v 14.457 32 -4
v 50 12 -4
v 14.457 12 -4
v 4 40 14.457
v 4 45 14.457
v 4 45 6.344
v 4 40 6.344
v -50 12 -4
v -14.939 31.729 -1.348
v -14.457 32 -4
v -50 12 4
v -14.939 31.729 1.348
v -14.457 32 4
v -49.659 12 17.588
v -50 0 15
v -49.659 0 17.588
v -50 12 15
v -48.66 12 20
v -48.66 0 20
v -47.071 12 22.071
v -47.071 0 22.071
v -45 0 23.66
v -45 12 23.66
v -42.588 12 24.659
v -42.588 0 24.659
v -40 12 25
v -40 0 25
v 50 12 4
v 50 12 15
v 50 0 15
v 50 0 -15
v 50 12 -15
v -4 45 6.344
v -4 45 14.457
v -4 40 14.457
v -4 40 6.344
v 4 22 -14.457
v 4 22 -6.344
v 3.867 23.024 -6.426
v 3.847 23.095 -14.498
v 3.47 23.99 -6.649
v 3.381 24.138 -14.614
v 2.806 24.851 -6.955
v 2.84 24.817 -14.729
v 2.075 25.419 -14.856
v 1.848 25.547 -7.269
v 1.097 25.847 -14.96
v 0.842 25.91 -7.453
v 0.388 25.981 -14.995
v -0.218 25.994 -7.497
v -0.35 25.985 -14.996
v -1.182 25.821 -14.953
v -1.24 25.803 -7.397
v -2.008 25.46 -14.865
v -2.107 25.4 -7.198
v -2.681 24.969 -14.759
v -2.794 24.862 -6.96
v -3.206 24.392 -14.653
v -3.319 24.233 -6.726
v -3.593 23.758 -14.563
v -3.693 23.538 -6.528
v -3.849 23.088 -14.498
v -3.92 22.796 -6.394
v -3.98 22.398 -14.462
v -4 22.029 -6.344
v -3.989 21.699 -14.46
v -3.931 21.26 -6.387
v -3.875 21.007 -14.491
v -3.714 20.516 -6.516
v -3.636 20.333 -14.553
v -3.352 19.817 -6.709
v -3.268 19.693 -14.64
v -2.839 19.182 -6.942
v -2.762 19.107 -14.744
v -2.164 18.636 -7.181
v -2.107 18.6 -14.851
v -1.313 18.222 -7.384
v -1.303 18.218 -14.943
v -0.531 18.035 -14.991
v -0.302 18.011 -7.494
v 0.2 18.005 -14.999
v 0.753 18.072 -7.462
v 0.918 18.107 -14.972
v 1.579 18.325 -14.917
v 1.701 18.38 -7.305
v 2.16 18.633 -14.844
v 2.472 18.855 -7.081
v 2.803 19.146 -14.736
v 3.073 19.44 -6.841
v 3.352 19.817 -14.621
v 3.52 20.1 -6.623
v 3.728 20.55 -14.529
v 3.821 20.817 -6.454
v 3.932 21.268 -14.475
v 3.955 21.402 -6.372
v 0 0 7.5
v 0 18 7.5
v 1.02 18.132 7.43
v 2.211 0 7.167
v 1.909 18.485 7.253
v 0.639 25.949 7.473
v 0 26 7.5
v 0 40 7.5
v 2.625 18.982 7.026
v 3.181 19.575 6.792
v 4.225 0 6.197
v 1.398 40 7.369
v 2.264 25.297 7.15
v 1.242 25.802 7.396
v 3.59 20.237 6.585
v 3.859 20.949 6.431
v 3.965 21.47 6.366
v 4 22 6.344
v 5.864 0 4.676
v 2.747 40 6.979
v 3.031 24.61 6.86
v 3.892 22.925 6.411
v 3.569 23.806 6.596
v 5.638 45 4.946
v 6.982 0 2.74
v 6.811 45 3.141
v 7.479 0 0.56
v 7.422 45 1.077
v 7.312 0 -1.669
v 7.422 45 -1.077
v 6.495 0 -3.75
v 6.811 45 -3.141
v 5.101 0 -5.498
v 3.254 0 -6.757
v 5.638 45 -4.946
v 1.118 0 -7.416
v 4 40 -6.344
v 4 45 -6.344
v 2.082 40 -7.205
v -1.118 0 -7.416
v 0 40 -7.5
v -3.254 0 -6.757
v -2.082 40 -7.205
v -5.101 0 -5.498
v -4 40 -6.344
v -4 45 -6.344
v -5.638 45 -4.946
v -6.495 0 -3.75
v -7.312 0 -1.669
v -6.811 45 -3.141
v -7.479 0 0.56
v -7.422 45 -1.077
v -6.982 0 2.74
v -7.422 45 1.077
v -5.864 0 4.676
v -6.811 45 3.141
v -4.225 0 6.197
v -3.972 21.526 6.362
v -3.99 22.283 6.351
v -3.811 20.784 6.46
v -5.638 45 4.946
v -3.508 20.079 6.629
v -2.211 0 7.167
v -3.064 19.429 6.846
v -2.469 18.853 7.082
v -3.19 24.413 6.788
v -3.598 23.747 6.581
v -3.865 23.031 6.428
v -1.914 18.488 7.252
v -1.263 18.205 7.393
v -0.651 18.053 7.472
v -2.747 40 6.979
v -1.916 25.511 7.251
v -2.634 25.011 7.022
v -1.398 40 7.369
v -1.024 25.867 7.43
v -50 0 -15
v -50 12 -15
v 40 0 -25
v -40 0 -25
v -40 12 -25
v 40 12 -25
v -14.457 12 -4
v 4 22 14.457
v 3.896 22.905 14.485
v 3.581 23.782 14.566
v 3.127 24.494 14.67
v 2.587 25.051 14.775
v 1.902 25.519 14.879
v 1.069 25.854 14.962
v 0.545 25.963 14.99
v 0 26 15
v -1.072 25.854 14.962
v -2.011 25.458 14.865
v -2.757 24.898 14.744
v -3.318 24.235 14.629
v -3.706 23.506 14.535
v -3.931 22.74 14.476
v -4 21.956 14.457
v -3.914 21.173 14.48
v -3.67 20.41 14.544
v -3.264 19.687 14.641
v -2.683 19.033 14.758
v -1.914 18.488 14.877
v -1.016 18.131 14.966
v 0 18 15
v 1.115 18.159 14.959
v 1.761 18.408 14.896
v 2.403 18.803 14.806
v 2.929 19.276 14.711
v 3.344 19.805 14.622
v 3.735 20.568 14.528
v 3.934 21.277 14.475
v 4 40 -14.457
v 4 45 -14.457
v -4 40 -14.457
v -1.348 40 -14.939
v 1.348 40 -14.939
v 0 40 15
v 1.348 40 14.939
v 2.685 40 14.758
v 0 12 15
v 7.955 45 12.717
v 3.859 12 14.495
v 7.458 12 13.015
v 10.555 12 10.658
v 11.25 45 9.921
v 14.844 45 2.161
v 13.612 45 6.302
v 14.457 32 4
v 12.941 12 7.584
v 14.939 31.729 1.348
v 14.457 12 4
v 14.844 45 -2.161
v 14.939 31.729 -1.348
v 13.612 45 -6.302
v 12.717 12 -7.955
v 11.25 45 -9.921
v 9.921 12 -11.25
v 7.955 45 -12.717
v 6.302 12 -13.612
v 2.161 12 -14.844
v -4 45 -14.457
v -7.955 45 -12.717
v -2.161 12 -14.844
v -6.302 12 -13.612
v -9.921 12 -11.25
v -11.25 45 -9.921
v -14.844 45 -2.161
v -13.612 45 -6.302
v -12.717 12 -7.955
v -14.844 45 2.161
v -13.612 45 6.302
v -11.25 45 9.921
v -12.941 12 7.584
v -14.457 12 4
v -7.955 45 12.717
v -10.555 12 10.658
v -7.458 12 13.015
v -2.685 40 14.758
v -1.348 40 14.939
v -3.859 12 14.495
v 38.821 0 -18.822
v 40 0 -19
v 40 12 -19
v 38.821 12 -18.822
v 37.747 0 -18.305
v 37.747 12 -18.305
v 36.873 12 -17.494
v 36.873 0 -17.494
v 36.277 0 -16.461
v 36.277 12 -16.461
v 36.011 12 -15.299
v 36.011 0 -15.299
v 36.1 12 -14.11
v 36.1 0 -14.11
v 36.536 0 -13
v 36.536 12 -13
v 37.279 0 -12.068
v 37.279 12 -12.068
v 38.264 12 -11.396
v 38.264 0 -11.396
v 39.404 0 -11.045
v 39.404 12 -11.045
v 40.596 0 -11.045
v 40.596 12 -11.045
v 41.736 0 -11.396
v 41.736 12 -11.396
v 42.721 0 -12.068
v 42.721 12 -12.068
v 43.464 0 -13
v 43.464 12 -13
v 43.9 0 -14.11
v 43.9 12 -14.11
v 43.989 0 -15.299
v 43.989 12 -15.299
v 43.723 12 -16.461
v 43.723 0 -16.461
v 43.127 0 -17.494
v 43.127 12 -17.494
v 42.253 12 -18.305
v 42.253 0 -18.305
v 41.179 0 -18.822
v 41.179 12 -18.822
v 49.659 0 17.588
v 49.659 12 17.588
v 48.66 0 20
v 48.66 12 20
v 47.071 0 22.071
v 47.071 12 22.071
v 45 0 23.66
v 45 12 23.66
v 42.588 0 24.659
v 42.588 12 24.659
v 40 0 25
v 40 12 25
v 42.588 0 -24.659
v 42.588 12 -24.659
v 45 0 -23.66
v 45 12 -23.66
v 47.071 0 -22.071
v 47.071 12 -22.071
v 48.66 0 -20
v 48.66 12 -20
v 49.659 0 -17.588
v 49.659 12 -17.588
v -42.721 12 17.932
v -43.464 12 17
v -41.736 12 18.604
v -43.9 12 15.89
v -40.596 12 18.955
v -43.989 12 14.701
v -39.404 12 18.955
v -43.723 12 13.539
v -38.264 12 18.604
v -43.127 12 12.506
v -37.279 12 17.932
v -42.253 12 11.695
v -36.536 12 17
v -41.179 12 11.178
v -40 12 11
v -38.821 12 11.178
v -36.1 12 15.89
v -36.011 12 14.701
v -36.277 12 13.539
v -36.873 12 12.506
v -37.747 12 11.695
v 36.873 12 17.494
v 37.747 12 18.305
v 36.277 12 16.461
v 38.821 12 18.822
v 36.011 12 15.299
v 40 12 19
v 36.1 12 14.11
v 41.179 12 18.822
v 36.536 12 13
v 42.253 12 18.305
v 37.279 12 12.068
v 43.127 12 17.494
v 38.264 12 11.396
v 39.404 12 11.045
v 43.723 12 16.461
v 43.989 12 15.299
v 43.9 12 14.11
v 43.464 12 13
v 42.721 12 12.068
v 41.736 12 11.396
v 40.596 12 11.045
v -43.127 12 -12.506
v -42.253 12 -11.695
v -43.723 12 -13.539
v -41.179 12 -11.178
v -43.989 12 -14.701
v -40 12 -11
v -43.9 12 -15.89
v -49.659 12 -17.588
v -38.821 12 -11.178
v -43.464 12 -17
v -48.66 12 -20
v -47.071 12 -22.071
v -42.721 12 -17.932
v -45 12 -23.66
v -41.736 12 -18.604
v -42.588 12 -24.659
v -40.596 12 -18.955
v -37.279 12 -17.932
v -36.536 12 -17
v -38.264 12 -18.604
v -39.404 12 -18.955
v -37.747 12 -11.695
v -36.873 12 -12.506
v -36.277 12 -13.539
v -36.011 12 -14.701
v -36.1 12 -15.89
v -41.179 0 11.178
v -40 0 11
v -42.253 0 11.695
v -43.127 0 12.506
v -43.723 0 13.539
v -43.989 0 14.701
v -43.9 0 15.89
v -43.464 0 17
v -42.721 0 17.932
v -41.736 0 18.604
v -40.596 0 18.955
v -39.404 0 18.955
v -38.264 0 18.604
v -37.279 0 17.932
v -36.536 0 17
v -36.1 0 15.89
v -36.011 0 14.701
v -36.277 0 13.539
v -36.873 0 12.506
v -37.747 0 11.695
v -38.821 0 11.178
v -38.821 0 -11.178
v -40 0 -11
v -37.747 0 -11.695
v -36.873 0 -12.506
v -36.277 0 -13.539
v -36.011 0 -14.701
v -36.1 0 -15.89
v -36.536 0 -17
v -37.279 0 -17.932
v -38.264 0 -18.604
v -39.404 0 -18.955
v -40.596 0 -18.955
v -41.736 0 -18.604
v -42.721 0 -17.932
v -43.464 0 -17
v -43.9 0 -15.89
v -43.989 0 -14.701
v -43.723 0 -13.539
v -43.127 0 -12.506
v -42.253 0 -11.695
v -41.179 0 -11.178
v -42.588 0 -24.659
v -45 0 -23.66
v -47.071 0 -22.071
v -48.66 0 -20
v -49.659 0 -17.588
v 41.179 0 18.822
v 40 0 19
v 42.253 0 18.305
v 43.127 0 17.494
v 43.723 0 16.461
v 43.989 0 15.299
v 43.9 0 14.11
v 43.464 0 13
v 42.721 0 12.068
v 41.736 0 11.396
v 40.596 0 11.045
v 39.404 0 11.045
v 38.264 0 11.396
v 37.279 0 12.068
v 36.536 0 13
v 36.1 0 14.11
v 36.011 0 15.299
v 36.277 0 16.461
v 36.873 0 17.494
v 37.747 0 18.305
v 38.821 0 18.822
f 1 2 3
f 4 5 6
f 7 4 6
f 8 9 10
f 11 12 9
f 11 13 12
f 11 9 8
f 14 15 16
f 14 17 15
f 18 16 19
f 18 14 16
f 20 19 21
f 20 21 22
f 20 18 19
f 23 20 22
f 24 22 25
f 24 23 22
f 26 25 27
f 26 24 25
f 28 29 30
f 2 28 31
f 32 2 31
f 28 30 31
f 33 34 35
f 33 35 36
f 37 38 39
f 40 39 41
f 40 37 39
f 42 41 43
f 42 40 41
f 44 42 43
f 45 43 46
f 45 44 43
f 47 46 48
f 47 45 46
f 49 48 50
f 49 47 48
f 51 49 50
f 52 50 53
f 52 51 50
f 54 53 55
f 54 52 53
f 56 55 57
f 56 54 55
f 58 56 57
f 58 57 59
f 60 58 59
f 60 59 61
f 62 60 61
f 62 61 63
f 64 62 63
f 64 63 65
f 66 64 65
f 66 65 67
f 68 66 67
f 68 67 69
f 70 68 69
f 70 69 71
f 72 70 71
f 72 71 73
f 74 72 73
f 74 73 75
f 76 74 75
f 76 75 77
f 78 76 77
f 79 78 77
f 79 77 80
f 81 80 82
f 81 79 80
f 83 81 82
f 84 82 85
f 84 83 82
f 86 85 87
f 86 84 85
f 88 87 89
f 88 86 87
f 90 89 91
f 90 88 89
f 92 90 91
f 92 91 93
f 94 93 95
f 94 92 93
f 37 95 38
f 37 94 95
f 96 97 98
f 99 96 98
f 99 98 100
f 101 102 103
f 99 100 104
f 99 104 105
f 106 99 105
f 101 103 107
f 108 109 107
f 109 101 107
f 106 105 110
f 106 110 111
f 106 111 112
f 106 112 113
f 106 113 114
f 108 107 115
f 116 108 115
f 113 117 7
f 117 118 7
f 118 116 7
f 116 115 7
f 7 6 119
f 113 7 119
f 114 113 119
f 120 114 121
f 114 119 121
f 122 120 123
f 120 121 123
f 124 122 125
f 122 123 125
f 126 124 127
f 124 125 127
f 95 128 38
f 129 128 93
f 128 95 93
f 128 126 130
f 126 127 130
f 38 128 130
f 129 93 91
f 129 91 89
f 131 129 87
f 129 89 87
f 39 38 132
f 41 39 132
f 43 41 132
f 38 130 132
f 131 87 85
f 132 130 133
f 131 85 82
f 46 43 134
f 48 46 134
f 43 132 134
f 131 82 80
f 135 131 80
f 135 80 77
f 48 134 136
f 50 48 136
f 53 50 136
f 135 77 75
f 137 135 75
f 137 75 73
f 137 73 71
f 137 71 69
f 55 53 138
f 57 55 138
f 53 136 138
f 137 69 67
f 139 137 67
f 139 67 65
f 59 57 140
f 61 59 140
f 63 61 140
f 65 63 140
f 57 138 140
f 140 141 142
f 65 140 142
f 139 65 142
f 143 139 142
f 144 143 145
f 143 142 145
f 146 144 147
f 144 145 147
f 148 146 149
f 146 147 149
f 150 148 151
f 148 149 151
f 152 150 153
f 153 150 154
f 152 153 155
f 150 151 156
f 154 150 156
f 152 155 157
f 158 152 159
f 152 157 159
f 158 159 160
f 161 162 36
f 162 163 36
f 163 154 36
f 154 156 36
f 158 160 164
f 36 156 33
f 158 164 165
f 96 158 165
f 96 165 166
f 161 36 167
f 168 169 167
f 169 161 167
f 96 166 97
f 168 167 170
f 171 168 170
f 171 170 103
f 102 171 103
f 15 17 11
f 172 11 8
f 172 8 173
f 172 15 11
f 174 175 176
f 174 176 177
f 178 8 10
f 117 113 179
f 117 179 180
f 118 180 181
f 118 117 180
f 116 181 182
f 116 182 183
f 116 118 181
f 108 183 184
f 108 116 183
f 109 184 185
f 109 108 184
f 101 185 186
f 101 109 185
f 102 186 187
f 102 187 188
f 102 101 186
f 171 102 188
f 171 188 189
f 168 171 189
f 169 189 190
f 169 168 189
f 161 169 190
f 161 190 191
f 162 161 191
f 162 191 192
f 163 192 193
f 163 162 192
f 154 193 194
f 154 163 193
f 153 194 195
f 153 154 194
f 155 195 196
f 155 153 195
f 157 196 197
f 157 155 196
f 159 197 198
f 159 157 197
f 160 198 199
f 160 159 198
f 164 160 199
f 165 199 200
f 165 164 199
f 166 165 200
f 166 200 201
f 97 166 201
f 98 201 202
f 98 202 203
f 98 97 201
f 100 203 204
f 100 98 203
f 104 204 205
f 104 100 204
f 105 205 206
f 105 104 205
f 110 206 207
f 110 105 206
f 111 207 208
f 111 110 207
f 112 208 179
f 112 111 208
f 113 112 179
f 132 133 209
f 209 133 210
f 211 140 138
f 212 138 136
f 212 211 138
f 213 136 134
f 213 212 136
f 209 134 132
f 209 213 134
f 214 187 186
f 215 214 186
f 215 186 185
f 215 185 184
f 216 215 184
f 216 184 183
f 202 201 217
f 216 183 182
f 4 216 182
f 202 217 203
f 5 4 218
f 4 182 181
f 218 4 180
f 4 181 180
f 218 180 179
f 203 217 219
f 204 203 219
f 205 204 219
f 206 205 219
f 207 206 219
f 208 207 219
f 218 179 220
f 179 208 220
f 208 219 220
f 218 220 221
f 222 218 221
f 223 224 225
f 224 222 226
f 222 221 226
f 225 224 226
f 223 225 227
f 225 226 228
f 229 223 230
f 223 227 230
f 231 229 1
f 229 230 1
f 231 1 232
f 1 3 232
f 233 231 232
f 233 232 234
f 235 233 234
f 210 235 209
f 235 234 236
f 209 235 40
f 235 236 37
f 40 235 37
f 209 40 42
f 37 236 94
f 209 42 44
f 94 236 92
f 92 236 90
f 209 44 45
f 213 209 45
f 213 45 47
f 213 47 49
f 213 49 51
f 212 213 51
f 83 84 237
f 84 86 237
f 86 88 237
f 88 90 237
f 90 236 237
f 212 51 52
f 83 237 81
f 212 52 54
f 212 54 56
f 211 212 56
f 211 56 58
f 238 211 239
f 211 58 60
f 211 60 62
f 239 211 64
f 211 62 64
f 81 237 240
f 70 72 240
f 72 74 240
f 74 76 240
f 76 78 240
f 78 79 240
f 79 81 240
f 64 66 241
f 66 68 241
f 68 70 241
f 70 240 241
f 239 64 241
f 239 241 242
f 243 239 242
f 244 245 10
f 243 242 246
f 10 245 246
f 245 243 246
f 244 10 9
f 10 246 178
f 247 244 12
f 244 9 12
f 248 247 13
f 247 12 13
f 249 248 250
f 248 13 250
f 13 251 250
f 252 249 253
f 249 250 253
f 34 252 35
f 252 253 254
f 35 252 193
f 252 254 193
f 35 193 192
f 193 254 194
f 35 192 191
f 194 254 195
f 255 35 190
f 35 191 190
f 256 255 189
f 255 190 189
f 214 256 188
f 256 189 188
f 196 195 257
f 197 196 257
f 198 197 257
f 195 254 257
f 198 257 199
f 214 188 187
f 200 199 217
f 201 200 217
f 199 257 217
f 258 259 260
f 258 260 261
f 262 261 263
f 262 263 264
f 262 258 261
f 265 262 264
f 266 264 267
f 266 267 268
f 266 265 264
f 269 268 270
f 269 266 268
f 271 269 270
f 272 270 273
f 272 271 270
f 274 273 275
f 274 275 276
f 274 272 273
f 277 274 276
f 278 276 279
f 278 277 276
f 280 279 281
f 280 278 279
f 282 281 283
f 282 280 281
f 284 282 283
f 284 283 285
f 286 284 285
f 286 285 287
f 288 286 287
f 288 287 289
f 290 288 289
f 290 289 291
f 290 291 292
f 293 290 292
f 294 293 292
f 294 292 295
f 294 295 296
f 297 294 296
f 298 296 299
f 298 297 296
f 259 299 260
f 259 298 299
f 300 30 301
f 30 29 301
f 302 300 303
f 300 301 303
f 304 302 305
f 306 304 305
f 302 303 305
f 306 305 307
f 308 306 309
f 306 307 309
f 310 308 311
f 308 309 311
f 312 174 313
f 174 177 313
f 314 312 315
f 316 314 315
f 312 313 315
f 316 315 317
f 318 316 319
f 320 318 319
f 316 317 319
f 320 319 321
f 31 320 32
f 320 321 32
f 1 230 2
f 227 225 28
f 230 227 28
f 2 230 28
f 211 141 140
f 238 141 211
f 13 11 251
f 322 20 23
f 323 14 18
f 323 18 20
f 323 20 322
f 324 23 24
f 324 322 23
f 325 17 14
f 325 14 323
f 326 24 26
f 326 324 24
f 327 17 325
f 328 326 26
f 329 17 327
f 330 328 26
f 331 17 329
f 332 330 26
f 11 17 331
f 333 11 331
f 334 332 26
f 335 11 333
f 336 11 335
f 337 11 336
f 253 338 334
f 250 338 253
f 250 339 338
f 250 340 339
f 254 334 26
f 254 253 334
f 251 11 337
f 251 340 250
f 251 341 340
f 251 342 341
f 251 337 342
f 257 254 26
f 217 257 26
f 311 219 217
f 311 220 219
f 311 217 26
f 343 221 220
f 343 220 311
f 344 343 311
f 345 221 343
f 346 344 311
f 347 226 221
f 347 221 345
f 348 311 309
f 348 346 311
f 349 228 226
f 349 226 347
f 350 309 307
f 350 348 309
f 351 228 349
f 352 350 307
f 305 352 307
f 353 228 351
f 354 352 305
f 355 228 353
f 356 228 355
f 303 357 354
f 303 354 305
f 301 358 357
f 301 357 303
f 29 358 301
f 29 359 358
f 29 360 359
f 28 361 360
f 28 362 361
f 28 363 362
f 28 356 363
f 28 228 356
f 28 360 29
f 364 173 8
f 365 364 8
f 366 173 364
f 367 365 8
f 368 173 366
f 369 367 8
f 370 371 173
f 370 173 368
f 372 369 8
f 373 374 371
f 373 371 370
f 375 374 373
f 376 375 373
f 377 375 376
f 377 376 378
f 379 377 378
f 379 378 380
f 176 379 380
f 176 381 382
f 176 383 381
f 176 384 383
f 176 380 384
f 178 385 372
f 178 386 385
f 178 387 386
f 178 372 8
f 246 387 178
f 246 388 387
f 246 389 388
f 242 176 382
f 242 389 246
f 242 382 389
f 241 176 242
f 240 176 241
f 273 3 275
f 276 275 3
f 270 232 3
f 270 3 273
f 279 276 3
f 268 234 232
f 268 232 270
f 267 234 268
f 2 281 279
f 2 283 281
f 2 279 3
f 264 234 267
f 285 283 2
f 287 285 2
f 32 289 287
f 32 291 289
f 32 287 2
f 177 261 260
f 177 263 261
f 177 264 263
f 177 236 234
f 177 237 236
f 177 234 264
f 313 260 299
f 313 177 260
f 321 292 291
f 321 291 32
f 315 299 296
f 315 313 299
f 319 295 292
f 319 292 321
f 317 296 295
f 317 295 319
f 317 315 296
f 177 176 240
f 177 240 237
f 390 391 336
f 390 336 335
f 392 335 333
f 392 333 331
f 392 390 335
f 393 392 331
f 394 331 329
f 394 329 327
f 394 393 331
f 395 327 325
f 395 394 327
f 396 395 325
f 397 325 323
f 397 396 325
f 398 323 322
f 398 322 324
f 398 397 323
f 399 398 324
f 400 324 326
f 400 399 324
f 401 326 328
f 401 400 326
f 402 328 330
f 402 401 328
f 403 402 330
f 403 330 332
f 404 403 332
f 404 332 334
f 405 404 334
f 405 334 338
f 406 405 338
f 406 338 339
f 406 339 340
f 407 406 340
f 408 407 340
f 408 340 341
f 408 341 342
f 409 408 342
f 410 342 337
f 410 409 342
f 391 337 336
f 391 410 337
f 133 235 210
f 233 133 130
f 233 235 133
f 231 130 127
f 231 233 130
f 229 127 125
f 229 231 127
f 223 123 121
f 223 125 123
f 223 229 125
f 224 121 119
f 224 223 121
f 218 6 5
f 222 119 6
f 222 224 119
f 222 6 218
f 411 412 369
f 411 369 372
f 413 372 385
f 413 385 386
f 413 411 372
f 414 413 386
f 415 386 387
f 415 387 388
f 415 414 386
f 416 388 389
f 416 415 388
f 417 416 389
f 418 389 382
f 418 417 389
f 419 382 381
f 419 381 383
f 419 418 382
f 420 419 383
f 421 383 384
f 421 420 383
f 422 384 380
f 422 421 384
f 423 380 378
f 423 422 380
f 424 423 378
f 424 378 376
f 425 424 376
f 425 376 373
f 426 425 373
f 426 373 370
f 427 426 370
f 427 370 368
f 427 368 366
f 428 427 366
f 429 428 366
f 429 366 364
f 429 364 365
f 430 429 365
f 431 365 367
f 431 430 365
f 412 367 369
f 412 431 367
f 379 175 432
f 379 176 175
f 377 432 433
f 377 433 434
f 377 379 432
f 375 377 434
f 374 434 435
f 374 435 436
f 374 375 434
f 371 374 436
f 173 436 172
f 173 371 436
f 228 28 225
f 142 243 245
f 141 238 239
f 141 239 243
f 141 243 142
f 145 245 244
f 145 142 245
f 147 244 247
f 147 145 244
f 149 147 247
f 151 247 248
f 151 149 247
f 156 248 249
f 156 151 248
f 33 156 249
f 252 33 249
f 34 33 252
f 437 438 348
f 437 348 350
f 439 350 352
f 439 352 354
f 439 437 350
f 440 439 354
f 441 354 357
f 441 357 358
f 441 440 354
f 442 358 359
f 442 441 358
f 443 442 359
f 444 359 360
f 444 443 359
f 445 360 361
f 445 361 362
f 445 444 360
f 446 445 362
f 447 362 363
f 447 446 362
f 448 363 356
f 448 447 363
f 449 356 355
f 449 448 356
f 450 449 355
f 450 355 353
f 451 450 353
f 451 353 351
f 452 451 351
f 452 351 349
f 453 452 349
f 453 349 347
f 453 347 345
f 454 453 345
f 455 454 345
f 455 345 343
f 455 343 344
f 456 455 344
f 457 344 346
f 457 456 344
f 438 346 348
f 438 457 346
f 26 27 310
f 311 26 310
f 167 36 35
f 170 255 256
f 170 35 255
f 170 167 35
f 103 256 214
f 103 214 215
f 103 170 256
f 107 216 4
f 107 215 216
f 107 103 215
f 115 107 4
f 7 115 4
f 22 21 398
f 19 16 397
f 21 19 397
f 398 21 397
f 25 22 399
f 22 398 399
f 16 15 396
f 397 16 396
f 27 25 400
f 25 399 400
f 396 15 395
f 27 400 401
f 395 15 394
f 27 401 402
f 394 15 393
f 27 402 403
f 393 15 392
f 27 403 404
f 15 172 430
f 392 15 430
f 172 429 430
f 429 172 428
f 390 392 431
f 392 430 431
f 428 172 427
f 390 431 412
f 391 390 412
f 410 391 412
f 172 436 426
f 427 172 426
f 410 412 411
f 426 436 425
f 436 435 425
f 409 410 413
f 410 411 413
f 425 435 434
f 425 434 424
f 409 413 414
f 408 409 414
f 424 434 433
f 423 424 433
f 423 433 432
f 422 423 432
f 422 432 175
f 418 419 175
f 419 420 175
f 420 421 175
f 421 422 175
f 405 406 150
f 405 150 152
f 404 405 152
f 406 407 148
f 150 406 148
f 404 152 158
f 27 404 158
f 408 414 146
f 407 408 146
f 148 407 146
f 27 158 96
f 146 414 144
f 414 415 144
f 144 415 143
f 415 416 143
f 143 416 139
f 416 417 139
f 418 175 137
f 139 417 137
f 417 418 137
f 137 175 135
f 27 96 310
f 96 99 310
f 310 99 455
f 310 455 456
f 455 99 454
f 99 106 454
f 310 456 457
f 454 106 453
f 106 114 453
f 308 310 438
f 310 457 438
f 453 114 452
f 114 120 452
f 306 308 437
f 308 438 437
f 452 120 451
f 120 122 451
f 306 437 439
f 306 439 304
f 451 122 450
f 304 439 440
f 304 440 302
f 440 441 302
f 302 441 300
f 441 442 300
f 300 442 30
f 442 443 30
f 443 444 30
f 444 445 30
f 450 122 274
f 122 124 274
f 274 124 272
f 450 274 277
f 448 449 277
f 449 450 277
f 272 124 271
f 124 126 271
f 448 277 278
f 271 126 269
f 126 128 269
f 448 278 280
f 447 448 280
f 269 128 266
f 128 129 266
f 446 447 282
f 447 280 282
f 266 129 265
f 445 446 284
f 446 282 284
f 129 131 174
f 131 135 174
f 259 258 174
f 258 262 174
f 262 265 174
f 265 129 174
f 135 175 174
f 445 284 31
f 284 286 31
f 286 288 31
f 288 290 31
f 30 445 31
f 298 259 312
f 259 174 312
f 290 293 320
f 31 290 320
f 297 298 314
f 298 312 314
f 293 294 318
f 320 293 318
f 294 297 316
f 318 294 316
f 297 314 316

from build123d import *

# Parameters (mm, degrees)
SKETCH_1_W               = 100
SKETCH_1_H               = 50
SKETCH_1_R               = 4
EXTRUDE_1_DEPTH          = 12
FILLET_1_R               = 10
FILLET_2_R               = 10
SKETCH_2_R               = 15
EXTRUDE_2_DEPTH          = 33
SKETCH_3_R               = 7.5
CUT_EXTRUDE_1_DEPTH      = 72.763500472
CUT_EXTRUDE_START        = -10
SKETCH_4_W               = 8
SKETCH_4_H               = 45
CUT_EXTRUDE_2_DEPTH      = 5
CUT_EXTRUDE_3_DEPTH      = 79.262379212
CUT_EXTRUDE_3_DEPTH_BACK = 79.262379212
SKETCH_5_R               = 4
EXTRUDE_3_DEPTH          = 8


with BuildPart() as part:
    # 草图1 → 凸台-拉伸1 (new body)
    with BuildSketch(Plane(origin=(0, 0, 0), x_dir=(1, 0, 0), z_dir=(0, 1, 0))):
        Rectangle(SKETCH_1_W, SKETCH_1_H)
        with Locations(Location((-40, 15, 0), (0, 0, 270))):
            Circle(SKETCH_1_R, mode=Mode.SUBTRACT)
        with Locations(Location((-40, -15, 0), (0, 0, 90))):
            Circle(SKETCH_1_R, mode=Mode.SUBTRACT)
        with Locations(Location((40, -15, 0), (0, 0, 270))):
            Circle(SKETCH_1_R, mode=Mode.SUBTRACT)
        with Locations(Location((40, 15, 0), (0, 0, 90))):
            Circle(SKETCH_1_R, mode=Mode.SUBTRACT)
    extrude(amount=EXTRUDE_1_DEPTH)

    # 圆角1
    fillet_1_edges = [part.edges().sort_by_distance(p)[0] for p in [
        (50, 6, -25),
    ]]
    fillet(fillet_1_edges, radius=FILLET_1_R)

    # 圆角2
    fillet_2_edges = [part.edges().sort_by_distance(p)[0] for p in [
        (-50, 6, -25),
        (50, 6, 25),
        (-50, 6, 25),
    ]]
    fillet(fillet_2_edges, radius=FILLET_2_R)

    # 草图2 → 凸台-拉伸2 (add)
    with BuildSketch(Plane(origin=(0, 12, 0), x_dir=(1, 0, 0), z_dir=(0, 1, 0))):
        with Locations(Location((0, 0, 0), (0, 0, 270))):
            Circle(SKETCH_2_R)
    extrude(amount=EXTRUDE_2_DEPTH)

    # 草图3 → 切除-拉伸1 (cut, through all)
    with BuildSketch(Plane(origin=(0, 45, 0), x_dir=(1, 0, 0), z_dir=(0, 1, 0))):
        with Locations(Location((0, 0, 0), (0, 0, 270))):
            Circle(SKETCH_3_R)
    extrude(amount=-CUT_EXTRUDE_1_DEPTH, mode=Mode.SUBTRACT)

    # 草图4 → 切除-拉伸2 (cut)
    with BuildSketch(Plane(origin=(0, 55, 0), x_dir=(1, 0, 0), z_dir=(0, 1, 0)).offset(CUT_EXTRUDE_START)):
        Rectangle(SKETCH_4_W, SKETCH_4_H)
    extrude(amount=-CUT_EXTRUDE_2_DEPTH, mode=Mode.SUBTRACT)

    # 草图5 → 切除-拉伸3 (cut, two sides: drawn at the far end of the back side and taken through both)
    with BuildSketch(Plane.XY.offset(15).offset(-CUT_EXTRUDE_3_DEPTH_BACK)):
        with Locations((0, 22)):
            Circle(SKETCH_5_R)
    extrude(amount=CUT_EXTRUDE_3_DEPTH + CUT_EXTRUDE_3_DEPTH_BACK, mode=Mode.SUBTRACT)

    # 草图8 → 凸台-拉伸3 (add)
    with BuildSketch(Plane.XY.offset(4)):
        Polygon((-50, 12), (-14.456832295, 12), (-14.456832295, 32), align=None)
    extrude_3 = extrude(amount=-EXTRUDE_3_DEPTH)

    # 镜向1: 凸台-拉伸3 across plane
    add(extrude_3.mirror(Plane(origin=(0, 0, 0), x_dir=(0, 0, 1), z_dir=(1, 0, 0))))


solid = part.part
